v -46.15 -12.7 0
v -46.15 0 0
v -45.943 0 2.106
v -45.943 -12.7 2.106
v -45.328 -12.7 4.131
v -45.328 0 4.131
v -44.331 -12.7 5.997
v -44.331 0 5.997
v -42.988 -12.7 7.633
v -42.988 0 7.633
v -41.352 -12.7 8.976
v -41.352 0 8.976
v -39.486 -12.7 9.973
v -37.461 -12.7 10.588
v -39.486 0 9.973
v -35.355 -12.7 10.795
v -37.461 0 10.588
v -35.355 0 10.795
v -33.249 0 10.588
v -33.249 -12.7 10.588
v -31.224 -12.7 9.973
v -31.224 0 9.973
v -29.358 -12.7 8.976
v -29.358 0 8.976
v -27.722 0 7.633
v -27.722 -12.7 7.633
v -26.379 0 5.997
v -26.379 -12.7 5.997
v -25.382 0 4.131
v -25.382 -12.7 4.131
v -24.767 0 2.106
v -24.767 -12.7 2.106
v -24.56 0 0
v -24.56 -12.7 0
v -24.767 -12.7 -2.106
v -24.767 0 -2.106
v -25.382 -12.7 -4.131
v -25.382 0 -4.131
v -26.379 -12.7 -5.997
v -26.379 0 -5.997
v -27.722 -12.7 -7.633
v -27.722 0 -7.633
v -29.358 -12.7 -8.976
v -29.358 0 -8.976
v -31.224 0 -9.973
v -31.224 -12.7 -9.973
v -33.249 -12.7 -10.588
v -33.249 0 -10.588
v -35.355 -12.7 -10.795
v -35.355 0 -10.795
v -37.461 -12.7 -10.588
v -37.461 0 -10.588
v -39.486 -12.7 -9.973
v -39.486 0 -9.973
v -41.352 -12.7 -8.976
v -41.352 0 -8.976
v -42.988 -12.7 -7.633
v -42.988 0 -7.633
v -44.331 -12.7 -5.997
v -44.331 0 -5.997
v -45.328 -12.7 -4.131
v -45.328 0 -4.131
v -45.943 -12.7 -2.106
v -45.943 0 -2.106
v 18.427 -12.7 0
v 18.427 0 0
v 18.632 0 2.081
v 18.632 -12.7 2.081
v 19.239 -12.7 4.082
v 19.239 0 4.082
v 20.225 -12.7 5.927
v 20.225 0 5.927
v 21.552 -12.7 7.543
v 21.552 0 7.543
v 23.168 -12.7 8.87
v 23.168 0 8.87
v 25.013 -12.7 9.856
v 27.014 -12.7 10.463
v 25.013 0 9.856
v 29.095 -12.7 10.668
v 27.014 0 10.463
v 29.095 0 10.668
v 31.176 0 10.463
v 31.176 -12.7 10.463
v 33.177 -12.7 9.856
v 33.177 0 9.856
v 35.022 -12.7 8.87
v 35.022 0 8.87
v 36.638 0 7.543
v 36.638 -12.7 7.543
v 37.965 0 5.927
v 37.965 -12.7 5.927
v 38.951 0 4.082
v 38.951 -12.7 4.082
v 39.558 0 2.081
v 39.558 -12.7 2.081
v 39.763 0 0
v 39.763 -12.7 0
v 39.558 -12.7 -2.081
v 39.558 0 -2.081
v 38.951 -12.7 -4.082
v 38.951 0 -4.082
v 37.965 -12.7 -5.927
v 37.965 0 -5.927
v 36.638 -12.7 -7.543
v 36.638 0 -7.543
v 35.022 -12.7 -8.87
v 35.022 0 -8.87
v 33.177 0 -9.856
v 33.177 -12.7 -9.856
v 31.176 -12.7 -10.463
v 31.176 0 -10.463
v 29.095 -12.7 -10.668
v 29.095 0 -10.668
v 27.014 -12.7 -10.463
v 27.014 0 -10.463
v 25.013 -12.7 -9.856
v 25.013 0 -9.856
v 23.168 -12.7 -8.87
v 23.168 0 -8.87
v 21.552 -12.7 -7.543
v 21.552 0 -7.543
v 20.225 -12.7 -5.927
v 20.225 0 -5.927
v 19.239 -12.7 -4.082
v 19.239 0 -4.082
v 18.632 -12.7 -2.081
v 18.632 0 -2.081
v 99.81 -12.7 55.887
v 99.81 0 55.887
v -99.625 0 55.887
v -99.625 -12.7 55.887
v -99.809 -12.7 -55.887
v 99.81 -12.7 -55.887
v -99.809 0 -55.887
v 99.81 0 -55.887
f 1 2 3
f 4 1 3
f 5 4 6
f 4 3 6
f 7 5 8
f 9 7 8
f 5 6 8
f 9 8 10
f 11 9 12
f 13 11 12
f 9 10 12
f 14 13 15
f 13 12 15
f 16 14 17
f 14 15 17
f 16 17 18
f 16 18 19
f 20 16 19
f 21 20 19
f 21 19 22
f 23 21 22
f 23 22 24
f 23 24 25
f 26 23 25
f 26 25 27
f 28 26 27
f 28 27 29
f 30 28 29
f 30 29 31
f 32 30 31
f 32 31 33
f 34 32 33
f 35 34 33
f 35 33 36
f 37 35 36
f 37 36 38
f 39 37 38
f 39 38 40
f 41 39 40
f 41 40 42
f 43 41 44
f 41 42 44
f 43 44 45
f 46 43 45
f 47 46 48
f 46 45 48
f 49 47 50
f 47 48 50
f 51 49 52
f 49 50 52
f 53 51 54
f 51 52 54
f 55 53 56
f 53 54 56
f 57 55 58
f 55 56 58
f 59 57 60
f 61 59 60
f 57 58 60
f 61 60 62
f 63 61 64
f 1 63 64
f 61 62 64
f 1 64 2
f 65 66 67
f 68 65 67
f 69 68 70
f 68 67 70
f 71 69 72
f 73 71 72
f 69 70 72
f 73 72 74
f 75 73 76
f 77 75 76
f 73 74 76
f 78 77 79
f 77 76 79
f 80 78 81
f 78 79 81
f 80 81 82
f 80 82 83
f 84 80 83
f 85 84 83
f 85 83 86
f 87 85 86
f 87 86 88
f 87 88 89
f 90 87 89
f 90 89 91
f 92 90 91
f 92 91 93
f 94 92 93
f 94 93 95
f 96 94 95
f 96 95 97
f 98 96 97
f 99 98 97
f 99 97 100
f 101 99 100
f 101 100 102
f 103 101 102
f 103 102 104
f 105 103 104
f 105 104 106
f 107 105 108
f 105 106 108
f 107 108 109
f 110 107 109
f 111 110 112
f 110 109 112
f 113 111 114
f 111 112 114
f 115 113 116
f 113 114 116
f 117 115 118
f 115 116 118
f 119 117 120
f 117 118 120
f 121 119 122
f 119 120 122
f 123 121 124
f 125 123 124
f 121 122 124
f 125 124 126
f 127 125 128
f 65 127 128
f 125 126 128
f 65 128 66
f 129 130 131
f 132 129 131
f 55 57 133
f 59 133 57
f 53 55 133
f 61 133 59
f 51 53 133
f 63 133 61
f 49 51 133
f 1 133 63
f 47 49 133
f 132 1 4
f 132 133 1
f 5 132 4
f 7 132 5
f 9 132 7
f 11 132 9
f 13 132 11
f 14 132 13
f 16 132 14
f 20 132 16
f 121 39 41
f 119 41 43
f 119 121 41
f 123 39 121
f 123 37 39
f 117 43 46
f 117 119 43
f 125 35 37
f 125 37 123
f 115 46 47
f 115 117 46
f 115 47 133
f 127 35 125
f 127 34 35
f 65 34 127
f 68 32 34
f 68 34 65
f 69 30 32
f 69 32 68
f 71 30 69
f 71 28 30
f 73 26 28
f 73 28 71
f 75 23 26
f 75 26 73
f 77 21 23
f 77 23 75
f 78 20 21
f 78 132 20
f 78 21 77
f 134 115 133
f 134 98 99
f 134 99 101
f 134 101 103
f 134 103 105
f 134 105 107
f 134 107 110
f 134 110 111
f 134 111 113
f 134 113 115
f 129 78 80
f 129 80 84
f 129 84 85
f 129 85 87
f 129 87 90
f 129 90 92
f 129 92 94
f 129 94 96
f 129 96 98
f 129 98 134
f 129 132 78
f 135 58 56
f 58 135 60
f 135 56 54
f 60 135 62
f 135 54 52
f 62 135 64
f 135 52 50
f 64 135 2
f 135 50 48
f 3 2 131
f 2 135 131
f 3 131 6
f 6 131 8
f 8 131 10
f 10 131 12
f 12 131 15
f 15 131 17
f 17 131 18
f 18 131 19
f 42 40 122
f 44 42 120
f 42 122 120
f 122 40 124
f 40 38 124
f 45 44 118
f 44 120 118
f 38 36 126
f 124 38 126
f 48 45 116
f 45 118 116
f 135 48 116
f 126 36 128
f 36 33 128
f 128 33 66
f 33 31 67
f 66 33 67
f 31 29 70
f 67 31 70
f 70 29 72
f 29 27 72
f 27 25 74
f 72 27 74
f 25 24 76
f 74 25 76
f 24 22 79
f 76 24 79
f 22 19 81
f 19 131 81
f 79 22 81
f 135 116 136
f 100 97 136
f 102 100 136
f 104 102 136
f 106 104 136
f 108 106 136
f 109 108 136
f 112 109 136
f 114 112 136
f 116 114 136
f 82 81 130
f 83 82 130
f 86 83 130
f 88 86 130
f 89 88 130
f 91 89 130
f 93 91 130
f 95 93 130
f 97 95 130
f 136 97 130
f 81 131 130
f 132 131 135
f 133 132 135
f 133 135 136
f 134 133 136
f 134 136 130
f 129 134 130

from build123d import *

# Parameters (mm, degrees)
F1_DEPTH = 12.7
F3_D     = 21.59
F5_D     = 21.336


with BuildPart() as f1:
    # F0 (on Front) → F1 (new body)
    with BuildSketch(Plane.XZ):
        Polygon((99.809796, 55.887308), (-99.624716, 55.887308), (-99.808872, -55.887308), (99.809796, -55.887308), align=None)
    extrude(amount=F1_DEPTH)

    # F3 (through all)
    with Locations(Plane.XZ.offset(12.7)):
        with Locations((-35.354935, 0)):
            Hole(F3_D / 2)

    # F5 (through all)
    with Locations(Plane.XZ.offset(12.7)):
        with Locations((29.095007, 0)):
            Hole(F5_D / 2)


solid = f1.part
